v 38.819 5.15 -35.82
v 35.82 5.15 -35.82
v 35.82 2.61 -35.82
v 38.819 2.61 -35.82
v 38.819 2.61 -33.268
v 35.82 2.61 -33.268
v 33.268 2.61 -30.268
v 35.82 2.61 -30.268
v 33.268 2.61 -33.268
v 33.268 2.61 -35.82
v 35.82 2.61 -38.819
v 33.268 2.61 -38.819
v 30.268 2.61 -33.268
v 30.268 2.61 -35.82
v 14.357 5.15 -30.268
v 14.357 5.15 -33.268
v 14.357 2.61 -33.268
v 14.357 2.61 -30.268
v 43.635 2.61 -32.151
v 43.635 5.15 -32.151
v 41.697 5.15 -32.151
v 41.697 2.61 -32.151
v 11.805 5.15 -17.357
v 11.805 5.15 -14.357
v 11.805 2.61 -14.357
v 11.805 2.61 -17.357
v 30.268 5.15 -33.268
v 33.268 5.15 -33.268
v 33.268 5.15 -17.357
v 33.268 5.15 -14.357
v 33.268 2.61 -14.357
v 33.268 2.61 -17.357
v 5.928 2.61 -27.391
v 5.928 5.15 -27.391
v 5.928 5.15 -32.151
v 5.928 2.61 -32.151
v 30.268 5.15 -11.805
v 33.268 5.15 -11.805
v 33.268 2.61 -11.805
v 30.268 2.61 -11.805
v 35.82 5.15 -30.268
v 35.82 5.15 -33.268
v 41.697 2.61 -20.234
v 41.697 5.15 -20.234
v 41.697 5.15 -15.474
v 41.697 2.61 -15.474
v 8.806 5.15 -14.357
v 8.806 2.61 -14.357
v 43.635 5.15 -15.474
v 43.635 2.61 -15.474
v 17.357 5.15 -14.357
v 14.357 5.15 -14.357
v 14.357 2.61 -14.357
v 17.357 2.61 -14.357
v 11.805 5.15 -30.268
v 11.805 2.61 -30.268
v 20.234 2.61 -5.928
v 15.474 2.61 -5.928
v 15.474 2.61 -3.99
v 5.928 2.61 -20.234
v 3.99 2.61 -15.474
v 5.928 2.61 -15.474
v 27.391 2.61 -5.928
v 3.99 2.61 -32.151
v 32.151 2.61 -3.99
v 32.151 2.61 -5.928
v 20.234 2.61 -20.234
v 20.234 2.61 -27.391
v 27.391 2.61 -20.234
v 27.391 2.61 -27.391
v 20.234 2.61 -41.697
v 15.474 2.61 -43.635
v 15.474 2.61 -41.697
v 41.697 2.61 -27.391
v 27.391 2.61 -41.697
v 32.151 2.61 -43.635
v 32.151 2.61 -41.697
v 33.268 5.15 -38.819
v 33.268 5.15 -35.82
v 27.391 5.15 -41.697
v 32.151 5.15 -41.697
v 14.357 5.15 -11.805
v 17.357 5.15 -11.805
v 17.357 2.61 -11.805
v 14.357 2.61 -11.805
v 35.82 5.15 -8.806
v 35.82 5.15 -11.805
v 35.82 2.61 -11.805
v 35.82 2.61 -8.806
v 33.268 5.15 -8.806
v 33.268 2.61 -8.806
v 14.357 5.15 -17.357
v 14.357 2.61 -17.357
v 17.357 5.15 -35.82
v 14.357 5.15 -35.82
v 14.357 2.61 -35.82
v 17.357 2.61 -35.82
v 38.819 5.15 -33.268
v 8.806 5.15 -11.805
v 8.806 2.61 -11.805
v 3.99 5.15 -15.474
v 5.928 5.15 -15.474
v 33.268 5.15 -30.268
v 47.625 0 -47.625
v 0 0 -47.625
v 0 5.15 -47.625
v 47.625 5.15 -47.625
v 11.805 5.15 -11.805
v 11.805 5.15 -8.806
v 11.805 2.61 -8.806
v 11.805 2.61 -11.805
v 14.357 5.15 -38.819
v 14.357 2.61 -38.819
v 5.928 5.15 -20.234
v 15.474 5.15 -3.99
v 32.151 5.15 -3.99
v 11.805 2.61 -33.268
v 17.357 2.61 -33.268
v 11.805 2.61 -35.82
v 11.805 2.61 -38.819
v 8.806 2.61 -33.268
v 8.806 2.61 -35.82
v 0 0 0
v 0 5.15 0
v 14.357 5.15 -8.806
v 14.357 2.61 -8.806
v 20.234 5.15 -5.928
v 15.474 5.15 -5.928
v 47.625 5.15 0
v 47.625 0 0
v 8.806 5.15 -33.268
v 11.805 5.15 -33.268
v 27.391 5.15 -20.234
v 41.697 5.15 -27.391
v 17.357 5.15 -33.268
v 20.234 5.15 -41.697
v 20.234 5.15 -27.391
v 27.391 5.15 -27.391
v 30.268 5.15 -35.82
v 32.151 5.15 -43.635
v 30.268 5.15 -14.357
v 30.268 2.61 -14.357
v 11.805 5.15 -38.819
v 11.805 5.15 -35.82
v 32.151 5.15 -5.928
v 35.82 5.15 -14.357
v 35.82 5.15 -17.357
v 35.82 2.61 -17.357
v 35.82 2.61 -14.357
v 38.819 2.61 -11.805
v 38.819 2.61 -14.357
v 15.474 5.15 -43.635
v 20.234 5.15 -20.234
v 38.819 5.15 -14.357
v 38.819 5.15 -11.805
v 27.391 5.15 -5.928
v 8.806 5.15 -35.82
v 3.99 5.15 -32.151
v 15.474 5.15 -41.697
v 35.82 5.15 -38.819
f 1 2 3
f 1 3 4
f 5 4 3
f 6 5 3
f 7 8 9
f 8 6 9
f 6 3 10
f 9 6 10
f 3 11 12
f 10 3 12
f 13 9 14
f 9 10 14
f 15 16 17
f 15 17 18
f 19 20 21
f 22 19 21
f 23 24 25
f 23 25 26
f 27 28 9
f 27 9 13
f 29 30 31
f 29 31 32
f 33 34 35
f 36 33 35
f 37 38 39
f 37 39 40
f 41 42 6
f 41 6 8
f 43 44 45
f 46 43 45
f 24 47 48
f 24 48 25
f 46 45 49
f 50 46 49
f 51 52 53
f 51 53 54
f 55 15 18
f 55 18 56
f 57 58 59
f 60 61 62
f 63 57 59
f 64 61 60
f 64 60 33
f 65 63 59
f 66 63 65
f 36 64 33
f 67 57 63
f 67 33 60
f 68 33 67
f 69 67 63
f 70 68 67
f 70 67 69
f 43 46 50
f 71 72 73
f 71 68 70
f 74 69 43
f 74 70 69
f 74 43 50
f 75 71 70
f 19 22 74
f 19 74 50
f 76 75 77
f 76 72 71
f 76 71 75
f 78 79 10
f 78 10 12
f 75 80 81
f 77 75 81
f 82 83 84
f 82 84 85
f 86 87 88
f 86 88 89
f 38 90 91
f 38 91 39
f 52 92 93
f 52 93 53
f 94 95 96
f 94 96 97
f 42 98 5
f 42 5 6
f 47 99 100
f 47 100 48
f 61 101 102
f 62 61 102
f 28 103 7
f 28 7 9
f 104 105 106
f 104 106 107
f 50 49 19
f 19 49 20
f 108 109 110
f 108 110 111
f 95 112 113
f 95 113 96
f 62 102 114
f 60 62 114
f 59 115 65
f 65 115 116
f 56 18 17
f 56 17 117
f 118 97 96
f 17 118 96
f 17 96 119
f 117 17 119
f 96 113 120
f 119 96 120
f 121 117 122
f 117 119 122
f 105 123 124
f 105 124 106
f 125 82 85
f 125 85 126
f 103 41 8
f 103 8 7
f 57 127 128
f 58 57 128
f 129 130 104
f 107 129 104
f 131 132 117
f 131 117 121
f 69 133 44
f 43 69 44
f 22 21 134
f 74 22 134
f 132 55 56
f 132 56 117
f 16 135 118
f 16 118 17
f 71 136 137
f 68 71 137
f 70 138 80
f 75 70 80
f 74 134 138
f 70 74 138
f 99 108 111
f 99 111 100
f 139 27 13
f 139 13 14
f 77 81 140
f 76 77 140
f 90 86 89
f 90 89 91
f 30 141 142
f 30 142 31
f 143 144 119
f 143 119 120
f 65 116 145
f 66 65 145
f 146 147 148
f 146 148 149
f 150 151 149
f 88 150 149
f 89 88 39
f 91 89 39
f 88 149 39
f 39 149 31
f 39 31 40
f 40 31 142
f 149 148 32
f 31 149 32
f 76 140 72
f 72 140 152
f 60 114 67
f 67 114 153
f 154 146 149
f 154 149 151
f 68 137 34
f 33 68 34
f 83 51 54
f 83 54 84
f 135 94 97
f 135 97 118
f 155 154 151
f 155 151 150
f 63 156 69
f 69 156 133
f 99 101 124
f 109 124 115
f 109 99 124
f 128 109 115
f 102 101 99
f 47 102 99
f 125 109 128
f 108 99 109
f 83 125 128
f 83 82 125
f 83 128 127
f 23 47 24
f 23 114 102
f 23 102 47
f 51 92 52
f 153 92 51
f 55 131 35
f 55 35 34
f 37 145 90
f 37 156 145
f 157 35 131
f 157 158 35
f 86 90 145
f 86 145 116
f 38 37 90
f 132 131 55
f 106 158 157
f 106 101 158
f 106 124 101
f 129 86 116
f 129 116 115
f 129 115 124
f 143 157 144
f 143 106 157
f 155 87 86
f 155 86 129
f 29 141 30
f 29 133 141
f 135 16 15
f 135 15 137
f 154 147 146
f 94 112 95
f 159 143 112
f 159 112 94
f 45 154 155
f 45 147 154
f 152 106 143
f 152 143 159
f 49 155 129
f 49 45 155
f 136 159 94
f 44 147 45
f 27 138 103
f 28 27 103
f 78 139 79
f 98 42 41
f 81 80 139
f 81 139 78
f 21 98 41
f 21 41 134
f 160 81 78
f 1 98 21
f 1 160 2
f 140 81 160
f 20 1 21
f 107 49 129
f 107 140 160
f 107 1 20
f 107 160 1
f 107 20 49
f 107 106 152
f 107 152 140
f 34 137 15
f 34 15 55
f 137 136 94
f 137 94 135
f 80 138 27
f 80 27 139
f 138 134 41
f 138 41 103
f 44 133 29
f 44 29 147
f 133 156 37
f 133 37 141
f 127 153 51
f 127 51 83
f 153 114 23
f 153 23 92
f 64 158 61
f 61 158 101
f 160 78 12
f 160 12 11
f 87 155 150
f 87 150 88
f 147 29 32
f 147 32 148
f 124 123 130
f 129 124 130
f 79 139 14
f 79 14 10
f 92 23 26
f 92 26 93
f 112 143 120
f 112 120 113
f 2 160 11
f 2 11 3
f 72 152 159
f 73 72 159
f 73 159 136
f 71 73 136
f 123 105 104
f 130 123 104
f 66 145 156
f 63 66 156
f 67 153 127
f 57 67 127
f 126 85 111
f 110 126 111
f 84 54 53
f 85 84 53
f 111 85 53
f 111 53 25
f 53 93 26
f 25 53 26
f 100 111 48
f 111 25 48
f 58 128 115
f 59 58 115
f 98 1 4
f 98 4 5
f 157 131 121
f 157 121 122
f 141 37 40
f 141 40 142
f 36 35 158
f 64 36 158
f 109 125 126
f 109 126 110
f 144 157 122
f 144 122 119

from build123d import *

# Parameters (mm, degrees)
SKETCH1_W           = 47.625
SKETCH1_H           = 47.625
BOSS_EXTRUDE1_DEPTH = 5.15
CUT_EXTRUDE1_DEPTH  = 2.54


with BuildPart() as part:
    # Sketch1 → Boss-Extrude1 (new body)
    with BuildSketch(Plane(origin=(0, 0, 0), x_dir=(1, 0, 0), z_dir=(0, 1, 0))):
        with Locations((23.8125, 23.8125)):
            Rectangle(SKETCH1_W, SKETCH1_H)
    extrude(amount=BOSS_EXTRUDE1_DEPTH)

    # Sketch2 → Cut-Extrude1 (cut)
    with BuildSketch(Plane(origin=(0, 5.15, 0), x_dir=(1, 0, 0), z_dir=(0, 1, 0))):
        Polygon((20.234147834, 27.390852166), (5.928370013, 27.390852166), (5.928370013, 32.150779252), (3.990438648, 32.150779252), (3.990438648, 15.474220748), (5.928370013, 15.474220748), (5.928370013, 20.234147834), (20.234147834, 20.234147834), (20.234147834, 5.928370013), (15.474220748, 5.928370013), (15.474220748, 3.990438648), (32.150779252, 3.990438648), (32.150779252, 5.928370013), (27.390852166, 5.928370013), (27.390852166, 20.234147834), (41.696629987, 20.234147834), (41.696629987, 15.474220748), (43.634561352, 15.474220748), (43.634561352, 32.150779252), (41.696629987, 32.150779252), (41.696629987, 27.390852166), (27.390852166, 27.390852166), (27.390852166, 41.696629987), (32.150779252, 41.696629987), (32.150779252, 43.634561352), (15.474220748, 43.634561352), (15.474220748, 41.696629987), (20.234147834, 41.696629987), align=None)
        Polygon((17.356946081, 35.819869232), (17.356946081, 33.26761292), (14.35738708, 33.26761292), (14.35738708, 30.268053919), (11.805130768, 30.268053919), (11.805130768, 33.26761292), (8.805571767, 33.26761292), (8.805571767, 35.819869232), (11.805130768, 35.819869232), (11.805130768, 38.819428233), (14.35738708, 38.819428233), (14.35738708, 35.819869232), align=None)
        Polygon((35.819869232, 30.268053919), (33.26761292, 30.268053919), (33.26761292, 33.26761292), (30.268053919, 33.26761292), (30.268053919, 35.819869232), (33.26761292, 35.819869232), (33.26761292, 38.819428233), (35.819869232, 38.819428233), (35.819869232, 35.819869232), (38.819428233, 35.819869232), (38.819428233, 33.26761292), (35.819869232, 33.26761292), align=None)
        Polygon((30.268053919, 11.805130768), (30.268053919, 14.35738708), (33.26761292, 14.35738708), (33.26761292, 17.356946081), (35.819869232, 17.356946081), (35.819869232, 14.35738708), (38.819428233, 14.35738708), (38.819428233, 11.805130768), (35.819869232, 11.805130768), (35.819869232, 8.805571767), (33.26761292, 8.805571767), (33.26761292, 11.805130768), align=None)
        Polygon((11.805130768, 17.356946081), (14.35738708, 17.356946081), (14.35738708, 14.35738708), (17.356946081, 14.35738708), (17.356946081, 11.805130768), (14.35738708, 11.805130768), (14.35738708, 8.805571767), (11.805130768, 8.805571767), (11.805130768, 11.805130768), (8.805571767, 11.805130768), (8.805571767, 14.35738708), (11.805130768, 14.35738708), align=None)
    extrude(amount=-CUT_EXTRUDE1_DEPTH, mode=Mode.SUBTRACT)


solid = part.part
